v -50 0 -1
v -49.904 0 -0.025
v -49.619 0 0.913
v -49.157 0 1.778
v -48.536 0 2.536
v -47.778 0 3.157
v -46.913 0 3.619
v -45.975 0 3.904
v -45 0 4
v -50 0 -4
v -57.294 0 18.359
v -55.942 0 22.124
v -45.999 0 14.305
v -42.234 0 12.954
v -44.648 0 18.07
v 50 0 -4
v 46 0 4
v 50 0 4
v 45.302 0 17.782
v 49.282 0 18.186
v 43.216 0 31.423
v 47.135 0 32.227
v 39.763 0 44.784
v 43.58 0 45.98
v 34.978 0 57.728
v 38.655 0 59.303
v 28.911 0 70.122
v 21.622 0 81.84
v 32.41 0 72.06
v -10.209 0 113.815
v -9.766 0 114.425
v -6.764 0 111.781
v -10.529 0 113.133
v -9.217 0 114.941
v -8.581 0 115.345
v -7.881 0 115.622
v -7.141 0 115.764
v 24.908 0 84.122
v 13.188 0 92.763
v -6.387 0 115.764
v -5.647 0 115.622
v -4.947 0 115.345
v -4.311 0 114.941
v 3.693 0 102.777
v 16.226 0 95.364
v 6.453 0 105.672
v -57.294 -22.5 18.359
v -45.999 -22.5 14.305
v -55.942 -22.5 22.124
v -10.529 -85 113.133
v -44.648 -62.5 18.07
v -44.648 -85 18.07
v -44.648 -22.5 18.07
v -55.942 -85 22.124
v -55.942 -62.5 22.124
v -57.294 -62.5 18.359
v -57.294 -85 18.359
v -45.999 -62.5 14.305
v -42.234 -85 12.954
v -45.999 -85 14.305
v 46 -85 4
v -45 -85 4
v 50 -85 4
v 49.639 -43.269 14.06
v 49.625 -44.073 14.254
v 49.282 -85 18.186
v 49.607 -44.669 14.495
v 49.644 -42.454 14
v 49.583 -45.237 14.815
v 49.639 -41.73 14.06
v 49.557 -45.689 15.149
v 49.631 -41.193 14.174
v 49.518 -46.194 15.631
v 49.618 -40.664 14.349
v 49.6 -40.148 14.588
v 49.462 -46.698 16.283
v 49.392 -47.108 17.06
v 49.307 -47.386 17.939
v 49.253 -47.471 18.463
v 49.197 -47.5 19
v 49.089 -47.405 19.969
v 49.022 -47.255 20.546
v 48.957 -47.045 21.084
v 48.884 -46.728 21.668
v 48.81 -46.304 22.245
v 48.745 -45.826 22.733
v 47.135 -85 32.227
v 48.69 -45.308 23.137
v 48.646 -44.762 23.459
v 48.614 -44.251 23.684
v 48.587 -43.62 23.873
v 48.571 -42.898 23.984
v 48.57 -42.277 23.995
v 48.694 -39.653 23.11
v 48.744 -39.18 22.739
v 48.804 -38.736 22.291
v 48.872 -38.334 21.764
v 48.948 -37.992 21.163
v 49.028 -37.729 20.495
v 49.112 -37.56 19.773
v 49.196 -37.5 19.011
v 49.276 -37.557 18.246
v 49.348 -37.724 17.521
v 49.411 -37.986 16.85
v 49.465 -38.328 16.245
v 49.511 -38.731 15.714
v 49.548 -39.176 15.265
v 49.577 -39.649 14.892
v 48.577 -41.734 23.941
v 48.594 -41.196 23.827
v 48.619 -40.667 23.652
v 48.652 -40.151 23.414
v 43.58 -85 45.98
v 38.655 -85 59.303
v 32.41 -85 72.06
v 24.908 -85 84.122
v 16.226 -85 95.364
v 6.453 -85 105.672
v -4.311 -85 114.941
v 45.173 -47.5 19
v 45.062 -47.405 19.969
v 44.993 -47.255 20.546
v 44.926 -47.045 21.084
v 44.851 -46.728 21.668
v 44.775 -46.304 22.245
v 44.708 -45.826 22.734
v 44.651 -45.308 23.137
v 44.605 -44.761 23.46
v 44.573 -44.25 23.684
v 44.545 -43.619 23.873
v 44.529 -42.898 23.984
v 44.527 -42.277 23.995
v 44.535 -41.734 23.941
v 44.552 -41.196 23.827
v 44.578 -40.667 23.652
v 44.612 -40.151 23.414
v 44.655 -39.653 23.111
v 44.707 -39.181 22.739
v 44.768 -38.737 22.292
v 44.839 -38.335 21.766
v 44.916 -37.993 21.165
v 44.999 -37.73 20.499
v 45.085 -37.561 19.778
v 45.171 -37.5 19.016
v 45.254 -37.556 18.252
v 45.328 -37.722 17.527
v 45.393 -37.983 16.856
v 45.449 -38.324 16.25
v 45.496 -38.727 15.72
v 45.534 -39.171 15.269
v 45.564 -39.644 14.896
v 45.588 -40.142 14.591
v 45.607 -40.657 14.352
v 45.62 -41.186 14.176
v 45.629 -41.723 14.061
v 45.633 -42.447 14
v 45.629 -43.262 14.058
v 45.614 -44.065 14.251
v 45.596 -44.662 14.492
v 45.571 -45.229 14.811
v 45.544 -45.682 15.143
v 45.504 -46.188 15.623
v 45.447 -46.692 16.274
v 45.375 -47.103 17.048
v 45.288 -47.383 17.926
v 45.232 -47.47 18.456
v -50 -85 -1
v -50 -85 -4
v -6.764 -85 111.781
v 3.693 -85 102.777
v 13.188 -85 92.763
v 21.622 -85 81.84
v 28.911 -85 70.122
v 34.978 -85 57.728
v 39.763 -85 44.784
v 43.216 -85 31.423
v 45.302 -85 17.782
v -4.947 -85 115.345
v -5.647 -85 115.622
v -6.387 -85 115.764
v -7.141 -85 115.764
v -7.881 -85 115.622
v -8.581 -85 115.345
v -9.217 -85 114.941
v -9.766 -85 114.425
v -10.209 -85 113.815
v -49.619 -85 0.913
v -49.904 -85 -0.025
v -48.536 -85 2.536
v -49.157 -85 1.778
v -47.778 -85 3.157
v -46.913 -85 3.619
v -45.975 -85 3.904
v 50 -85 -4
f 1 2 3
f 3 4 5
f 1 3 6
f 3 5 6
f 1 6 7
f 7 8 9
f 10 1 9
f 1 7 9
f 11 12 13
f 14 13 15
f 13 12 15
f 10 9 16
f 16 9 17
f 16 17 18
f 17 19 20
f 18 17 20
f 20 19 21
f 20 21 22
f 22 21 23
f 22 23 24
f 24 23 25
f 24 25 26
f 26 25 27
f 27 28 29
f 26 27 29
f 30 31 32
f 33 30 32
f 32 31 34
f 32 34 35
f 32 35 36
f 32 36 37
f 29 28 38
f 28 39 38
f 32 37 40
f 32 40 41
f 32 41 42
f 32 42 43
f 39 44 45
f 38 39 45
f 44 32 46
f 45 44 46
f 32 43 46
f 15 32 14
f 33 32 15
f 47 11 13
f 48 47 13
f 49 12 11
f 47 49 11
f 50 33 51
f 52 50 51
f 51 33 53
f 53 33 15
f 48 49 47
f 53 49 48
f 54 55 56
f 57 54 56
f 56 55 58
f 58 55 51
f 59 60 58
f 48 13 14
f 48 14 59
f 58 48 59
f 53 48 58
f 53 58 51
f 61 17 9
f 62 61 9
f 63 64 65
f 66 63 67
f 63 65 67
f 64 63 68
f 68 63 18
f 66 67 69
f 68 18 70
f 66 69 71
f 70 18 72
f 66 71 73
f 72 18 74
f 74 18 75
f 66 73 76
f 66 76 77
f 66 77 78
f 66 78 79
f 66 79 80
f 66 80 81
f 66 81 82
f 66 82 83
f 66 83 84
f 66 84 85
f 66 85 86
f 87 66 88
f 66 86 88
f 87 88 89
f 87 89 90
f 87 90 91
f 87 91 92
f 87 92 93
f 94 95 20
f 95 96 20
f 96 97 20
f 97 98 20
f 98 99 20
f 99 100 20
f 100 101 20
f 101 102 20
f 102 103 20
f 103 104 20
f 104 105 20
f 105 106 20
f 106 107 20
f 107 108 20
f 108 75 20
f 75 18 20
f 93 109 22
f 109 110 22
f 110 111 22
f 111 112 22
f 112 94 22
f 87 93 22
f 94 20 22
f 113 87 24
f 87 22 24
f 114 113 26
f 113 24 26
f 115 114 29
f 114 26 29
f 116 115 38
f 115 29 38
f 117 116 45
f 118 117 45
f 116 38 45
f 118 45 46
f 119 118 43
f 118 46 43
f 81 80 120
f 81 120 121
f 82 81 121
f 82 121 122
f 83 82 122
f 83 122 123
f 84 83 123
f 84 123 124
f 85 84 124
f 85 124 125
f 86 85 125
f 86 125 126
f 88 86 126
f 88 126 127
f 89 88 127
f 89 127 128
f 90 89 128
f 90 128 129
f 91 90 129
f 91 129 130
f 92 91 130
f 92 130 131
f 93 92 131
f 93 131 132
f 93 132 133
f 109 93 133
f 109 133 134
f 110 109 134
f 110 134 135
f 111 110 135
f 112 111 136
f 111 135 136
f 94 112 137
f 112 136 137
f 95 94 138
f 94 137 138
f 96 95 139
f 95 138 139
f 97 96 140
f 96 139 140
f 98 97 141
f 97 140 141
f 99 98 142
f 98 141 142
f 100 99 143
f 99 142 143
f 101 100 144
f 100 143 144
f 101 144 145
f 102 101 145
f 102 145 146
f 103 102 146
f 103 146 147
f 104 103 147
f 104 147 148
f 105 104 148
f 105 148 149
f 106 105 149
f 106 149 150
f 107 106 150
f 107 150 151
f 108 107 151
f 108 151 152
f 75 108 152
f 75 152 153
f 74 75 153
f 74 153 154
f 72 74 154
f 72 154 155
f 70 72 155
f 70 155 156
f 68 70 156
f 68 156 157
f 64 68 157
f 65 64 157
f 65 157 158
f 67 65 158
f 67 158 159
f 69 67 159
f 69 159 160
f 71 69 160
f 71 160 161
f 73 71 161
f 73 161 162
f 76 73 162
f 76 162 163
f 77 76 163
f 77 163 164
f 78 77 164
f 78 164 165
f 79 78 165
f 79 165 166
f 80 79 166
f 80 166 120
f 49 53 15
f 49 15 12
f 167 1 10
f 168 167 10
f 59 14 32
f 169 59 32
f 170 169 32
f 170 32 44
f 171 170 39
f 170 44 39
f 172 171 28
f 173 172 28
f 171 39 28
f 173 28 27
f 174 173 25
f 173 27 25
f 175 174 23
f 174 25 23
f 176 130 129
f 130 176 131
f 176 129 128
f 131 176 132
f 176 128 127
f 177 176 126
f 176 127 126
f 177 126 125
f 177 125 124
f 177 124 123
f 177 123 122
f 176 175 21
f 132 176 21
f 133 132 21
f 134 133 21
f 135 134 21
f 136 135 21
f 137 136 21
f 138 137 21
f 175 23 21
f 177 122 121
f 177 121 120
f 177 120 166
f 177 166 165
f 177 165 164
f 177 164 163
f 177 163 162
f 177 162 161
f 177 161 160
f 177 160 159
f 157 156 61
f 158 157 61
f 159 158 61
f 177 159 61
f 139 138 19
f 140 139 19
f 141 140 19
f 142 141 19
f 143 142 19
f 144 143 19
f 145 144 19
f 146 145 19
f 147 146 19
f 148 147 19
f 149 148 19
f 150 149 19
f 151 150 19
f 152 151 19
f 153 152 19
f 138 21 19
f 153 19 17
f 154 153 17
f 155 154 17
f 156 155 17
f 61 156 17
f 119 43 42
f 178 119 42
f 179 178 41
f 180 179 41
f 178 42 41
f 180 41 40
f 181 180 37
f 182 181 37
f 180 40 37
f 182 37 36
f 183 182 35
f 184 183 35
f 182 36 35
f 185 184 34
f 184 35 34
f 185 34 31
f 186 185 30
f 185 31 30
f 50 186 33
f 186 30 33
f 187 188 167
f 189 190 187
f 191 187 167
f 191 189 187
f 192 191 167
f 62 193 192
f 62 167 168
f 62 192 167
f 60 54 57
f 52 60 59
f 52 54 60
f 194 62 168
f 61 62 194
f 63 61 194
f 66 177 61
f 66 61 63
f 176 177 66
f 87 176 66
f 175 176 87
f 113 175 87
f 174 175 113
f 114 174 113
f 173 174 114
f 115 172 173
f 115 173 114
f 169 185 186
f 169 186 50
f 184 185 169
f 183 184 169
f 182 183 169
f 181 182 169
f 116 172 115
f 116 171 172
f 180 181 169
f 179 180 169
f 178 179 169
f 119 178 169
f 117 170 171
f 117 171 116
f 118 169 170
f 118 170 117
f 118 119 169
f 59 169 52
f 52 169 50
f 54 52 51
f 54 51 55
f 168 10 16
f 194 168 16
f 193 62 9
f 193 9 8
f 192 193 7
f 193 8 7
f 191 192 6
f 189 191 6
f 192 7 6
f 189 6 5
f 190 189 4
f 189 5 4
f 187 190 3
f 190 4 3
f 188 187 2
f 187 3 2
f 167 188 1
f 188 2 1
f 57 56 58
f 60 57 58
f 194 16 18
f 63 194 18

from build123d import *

# Parameters (mm, degrees)
F1_DEPTH = 85
F2_START = 22.5
F2_DEPTH = 40
F4_D     = 10
F4_DEPTH = 12
F4_START = 1.4311325
F4_TIP   = 3.0043030951


# Not quite as in the source:
# - a feature names something its author has since deleted; it is built from what else it names


with BuildPart() as f1:
    # F0 (on Front) → F1 (new body)
    with BuildSketch(Plane.XZ):
        with BuildLine():
            Line((-50, -4), (50, -4))
            Line((50, -4), (50, 4))
            Line((50, 4), (46, 4))
            Line((46, 4), (-45, 4))
            ThreePointArc((-45, 4), (-48.5355339059, 2.5355339059), (-50, -1))
            Line((-50, -1), (-50, -4))
        make_face()
        with BuildLine():
            Line((-6.7640438608, 111.7814914912), (-4.3106391095, 114.9407327175))
            ThreePointArc((-4.3106391095, 114.9407327175), (-7.8808210545, 115.6224300093), (-10.5289002901, 113.1327339074))
            Line((-10.5289002901, 113.1327339074), (-6.7640438608, 111.7814914912))
        make_face()
        with BuildLine():
            Line((46, 4), (50, 4))
            ThreePointArc((50, 4), (35.6938059368, 65.7606098099), (-4.3106391095, 114.9407327175))
            Line((-4.3106391095, 114.9407327175), (-6.7640438608, 111.7814914912))
            ThreePointArc((-6.7640438608, 111.7814914912), (32.1012011015, 64.0018629557), (46, 4))
        make_face()
        Polygon((-42.2341572851, 12.9540102238), (-6.7640438608, 111.7814914912), (-10.5289002901, 113.1327339074), (-44.6477712982, 18.0701090692), (-45.9990137144, 14.3052526399), align=None)
        Polygon((-45.9990137144, 14.3052526399), (-44.6477712982, 18.0701090692), (-55.9423405859, 22.1238363177), (-57.2935830021, 18.3589798884), align=None)
    extrude(amount=F1_DEPTH)

    # F0 (on Front) → F2 (cut)
    with BuildSketch(Plane.XZ.offset(F2_START)):
        Polygon((-45.9990137144, 14.3052526399), (-44.6477712982, 18.0701090692), (-55.9423405859, 22.1238363177), (-57.2935830021, 18.3589798884), align=None)
    extrude(amount=F2_DEPTH, mode=Mode.SUBTRACT)

    # F4
    # its depths count from where the whole tool has entered the part; down to there all is cleared
    with Locations(Plane.YZ.offset(50).offset(-F4_START)):
        with Locations((-42.5, 19)):
            Hole(F4_D / 2, depth=F4_DEPTH)
            with Locations((0, 0, -(F4_DEPTH + F4_TIP / 2))):  # 118° drill point
                Cone(0, F4_D / 2, F4_TIP, mode=Mode.SUBTRACT)


solid = f1.part
